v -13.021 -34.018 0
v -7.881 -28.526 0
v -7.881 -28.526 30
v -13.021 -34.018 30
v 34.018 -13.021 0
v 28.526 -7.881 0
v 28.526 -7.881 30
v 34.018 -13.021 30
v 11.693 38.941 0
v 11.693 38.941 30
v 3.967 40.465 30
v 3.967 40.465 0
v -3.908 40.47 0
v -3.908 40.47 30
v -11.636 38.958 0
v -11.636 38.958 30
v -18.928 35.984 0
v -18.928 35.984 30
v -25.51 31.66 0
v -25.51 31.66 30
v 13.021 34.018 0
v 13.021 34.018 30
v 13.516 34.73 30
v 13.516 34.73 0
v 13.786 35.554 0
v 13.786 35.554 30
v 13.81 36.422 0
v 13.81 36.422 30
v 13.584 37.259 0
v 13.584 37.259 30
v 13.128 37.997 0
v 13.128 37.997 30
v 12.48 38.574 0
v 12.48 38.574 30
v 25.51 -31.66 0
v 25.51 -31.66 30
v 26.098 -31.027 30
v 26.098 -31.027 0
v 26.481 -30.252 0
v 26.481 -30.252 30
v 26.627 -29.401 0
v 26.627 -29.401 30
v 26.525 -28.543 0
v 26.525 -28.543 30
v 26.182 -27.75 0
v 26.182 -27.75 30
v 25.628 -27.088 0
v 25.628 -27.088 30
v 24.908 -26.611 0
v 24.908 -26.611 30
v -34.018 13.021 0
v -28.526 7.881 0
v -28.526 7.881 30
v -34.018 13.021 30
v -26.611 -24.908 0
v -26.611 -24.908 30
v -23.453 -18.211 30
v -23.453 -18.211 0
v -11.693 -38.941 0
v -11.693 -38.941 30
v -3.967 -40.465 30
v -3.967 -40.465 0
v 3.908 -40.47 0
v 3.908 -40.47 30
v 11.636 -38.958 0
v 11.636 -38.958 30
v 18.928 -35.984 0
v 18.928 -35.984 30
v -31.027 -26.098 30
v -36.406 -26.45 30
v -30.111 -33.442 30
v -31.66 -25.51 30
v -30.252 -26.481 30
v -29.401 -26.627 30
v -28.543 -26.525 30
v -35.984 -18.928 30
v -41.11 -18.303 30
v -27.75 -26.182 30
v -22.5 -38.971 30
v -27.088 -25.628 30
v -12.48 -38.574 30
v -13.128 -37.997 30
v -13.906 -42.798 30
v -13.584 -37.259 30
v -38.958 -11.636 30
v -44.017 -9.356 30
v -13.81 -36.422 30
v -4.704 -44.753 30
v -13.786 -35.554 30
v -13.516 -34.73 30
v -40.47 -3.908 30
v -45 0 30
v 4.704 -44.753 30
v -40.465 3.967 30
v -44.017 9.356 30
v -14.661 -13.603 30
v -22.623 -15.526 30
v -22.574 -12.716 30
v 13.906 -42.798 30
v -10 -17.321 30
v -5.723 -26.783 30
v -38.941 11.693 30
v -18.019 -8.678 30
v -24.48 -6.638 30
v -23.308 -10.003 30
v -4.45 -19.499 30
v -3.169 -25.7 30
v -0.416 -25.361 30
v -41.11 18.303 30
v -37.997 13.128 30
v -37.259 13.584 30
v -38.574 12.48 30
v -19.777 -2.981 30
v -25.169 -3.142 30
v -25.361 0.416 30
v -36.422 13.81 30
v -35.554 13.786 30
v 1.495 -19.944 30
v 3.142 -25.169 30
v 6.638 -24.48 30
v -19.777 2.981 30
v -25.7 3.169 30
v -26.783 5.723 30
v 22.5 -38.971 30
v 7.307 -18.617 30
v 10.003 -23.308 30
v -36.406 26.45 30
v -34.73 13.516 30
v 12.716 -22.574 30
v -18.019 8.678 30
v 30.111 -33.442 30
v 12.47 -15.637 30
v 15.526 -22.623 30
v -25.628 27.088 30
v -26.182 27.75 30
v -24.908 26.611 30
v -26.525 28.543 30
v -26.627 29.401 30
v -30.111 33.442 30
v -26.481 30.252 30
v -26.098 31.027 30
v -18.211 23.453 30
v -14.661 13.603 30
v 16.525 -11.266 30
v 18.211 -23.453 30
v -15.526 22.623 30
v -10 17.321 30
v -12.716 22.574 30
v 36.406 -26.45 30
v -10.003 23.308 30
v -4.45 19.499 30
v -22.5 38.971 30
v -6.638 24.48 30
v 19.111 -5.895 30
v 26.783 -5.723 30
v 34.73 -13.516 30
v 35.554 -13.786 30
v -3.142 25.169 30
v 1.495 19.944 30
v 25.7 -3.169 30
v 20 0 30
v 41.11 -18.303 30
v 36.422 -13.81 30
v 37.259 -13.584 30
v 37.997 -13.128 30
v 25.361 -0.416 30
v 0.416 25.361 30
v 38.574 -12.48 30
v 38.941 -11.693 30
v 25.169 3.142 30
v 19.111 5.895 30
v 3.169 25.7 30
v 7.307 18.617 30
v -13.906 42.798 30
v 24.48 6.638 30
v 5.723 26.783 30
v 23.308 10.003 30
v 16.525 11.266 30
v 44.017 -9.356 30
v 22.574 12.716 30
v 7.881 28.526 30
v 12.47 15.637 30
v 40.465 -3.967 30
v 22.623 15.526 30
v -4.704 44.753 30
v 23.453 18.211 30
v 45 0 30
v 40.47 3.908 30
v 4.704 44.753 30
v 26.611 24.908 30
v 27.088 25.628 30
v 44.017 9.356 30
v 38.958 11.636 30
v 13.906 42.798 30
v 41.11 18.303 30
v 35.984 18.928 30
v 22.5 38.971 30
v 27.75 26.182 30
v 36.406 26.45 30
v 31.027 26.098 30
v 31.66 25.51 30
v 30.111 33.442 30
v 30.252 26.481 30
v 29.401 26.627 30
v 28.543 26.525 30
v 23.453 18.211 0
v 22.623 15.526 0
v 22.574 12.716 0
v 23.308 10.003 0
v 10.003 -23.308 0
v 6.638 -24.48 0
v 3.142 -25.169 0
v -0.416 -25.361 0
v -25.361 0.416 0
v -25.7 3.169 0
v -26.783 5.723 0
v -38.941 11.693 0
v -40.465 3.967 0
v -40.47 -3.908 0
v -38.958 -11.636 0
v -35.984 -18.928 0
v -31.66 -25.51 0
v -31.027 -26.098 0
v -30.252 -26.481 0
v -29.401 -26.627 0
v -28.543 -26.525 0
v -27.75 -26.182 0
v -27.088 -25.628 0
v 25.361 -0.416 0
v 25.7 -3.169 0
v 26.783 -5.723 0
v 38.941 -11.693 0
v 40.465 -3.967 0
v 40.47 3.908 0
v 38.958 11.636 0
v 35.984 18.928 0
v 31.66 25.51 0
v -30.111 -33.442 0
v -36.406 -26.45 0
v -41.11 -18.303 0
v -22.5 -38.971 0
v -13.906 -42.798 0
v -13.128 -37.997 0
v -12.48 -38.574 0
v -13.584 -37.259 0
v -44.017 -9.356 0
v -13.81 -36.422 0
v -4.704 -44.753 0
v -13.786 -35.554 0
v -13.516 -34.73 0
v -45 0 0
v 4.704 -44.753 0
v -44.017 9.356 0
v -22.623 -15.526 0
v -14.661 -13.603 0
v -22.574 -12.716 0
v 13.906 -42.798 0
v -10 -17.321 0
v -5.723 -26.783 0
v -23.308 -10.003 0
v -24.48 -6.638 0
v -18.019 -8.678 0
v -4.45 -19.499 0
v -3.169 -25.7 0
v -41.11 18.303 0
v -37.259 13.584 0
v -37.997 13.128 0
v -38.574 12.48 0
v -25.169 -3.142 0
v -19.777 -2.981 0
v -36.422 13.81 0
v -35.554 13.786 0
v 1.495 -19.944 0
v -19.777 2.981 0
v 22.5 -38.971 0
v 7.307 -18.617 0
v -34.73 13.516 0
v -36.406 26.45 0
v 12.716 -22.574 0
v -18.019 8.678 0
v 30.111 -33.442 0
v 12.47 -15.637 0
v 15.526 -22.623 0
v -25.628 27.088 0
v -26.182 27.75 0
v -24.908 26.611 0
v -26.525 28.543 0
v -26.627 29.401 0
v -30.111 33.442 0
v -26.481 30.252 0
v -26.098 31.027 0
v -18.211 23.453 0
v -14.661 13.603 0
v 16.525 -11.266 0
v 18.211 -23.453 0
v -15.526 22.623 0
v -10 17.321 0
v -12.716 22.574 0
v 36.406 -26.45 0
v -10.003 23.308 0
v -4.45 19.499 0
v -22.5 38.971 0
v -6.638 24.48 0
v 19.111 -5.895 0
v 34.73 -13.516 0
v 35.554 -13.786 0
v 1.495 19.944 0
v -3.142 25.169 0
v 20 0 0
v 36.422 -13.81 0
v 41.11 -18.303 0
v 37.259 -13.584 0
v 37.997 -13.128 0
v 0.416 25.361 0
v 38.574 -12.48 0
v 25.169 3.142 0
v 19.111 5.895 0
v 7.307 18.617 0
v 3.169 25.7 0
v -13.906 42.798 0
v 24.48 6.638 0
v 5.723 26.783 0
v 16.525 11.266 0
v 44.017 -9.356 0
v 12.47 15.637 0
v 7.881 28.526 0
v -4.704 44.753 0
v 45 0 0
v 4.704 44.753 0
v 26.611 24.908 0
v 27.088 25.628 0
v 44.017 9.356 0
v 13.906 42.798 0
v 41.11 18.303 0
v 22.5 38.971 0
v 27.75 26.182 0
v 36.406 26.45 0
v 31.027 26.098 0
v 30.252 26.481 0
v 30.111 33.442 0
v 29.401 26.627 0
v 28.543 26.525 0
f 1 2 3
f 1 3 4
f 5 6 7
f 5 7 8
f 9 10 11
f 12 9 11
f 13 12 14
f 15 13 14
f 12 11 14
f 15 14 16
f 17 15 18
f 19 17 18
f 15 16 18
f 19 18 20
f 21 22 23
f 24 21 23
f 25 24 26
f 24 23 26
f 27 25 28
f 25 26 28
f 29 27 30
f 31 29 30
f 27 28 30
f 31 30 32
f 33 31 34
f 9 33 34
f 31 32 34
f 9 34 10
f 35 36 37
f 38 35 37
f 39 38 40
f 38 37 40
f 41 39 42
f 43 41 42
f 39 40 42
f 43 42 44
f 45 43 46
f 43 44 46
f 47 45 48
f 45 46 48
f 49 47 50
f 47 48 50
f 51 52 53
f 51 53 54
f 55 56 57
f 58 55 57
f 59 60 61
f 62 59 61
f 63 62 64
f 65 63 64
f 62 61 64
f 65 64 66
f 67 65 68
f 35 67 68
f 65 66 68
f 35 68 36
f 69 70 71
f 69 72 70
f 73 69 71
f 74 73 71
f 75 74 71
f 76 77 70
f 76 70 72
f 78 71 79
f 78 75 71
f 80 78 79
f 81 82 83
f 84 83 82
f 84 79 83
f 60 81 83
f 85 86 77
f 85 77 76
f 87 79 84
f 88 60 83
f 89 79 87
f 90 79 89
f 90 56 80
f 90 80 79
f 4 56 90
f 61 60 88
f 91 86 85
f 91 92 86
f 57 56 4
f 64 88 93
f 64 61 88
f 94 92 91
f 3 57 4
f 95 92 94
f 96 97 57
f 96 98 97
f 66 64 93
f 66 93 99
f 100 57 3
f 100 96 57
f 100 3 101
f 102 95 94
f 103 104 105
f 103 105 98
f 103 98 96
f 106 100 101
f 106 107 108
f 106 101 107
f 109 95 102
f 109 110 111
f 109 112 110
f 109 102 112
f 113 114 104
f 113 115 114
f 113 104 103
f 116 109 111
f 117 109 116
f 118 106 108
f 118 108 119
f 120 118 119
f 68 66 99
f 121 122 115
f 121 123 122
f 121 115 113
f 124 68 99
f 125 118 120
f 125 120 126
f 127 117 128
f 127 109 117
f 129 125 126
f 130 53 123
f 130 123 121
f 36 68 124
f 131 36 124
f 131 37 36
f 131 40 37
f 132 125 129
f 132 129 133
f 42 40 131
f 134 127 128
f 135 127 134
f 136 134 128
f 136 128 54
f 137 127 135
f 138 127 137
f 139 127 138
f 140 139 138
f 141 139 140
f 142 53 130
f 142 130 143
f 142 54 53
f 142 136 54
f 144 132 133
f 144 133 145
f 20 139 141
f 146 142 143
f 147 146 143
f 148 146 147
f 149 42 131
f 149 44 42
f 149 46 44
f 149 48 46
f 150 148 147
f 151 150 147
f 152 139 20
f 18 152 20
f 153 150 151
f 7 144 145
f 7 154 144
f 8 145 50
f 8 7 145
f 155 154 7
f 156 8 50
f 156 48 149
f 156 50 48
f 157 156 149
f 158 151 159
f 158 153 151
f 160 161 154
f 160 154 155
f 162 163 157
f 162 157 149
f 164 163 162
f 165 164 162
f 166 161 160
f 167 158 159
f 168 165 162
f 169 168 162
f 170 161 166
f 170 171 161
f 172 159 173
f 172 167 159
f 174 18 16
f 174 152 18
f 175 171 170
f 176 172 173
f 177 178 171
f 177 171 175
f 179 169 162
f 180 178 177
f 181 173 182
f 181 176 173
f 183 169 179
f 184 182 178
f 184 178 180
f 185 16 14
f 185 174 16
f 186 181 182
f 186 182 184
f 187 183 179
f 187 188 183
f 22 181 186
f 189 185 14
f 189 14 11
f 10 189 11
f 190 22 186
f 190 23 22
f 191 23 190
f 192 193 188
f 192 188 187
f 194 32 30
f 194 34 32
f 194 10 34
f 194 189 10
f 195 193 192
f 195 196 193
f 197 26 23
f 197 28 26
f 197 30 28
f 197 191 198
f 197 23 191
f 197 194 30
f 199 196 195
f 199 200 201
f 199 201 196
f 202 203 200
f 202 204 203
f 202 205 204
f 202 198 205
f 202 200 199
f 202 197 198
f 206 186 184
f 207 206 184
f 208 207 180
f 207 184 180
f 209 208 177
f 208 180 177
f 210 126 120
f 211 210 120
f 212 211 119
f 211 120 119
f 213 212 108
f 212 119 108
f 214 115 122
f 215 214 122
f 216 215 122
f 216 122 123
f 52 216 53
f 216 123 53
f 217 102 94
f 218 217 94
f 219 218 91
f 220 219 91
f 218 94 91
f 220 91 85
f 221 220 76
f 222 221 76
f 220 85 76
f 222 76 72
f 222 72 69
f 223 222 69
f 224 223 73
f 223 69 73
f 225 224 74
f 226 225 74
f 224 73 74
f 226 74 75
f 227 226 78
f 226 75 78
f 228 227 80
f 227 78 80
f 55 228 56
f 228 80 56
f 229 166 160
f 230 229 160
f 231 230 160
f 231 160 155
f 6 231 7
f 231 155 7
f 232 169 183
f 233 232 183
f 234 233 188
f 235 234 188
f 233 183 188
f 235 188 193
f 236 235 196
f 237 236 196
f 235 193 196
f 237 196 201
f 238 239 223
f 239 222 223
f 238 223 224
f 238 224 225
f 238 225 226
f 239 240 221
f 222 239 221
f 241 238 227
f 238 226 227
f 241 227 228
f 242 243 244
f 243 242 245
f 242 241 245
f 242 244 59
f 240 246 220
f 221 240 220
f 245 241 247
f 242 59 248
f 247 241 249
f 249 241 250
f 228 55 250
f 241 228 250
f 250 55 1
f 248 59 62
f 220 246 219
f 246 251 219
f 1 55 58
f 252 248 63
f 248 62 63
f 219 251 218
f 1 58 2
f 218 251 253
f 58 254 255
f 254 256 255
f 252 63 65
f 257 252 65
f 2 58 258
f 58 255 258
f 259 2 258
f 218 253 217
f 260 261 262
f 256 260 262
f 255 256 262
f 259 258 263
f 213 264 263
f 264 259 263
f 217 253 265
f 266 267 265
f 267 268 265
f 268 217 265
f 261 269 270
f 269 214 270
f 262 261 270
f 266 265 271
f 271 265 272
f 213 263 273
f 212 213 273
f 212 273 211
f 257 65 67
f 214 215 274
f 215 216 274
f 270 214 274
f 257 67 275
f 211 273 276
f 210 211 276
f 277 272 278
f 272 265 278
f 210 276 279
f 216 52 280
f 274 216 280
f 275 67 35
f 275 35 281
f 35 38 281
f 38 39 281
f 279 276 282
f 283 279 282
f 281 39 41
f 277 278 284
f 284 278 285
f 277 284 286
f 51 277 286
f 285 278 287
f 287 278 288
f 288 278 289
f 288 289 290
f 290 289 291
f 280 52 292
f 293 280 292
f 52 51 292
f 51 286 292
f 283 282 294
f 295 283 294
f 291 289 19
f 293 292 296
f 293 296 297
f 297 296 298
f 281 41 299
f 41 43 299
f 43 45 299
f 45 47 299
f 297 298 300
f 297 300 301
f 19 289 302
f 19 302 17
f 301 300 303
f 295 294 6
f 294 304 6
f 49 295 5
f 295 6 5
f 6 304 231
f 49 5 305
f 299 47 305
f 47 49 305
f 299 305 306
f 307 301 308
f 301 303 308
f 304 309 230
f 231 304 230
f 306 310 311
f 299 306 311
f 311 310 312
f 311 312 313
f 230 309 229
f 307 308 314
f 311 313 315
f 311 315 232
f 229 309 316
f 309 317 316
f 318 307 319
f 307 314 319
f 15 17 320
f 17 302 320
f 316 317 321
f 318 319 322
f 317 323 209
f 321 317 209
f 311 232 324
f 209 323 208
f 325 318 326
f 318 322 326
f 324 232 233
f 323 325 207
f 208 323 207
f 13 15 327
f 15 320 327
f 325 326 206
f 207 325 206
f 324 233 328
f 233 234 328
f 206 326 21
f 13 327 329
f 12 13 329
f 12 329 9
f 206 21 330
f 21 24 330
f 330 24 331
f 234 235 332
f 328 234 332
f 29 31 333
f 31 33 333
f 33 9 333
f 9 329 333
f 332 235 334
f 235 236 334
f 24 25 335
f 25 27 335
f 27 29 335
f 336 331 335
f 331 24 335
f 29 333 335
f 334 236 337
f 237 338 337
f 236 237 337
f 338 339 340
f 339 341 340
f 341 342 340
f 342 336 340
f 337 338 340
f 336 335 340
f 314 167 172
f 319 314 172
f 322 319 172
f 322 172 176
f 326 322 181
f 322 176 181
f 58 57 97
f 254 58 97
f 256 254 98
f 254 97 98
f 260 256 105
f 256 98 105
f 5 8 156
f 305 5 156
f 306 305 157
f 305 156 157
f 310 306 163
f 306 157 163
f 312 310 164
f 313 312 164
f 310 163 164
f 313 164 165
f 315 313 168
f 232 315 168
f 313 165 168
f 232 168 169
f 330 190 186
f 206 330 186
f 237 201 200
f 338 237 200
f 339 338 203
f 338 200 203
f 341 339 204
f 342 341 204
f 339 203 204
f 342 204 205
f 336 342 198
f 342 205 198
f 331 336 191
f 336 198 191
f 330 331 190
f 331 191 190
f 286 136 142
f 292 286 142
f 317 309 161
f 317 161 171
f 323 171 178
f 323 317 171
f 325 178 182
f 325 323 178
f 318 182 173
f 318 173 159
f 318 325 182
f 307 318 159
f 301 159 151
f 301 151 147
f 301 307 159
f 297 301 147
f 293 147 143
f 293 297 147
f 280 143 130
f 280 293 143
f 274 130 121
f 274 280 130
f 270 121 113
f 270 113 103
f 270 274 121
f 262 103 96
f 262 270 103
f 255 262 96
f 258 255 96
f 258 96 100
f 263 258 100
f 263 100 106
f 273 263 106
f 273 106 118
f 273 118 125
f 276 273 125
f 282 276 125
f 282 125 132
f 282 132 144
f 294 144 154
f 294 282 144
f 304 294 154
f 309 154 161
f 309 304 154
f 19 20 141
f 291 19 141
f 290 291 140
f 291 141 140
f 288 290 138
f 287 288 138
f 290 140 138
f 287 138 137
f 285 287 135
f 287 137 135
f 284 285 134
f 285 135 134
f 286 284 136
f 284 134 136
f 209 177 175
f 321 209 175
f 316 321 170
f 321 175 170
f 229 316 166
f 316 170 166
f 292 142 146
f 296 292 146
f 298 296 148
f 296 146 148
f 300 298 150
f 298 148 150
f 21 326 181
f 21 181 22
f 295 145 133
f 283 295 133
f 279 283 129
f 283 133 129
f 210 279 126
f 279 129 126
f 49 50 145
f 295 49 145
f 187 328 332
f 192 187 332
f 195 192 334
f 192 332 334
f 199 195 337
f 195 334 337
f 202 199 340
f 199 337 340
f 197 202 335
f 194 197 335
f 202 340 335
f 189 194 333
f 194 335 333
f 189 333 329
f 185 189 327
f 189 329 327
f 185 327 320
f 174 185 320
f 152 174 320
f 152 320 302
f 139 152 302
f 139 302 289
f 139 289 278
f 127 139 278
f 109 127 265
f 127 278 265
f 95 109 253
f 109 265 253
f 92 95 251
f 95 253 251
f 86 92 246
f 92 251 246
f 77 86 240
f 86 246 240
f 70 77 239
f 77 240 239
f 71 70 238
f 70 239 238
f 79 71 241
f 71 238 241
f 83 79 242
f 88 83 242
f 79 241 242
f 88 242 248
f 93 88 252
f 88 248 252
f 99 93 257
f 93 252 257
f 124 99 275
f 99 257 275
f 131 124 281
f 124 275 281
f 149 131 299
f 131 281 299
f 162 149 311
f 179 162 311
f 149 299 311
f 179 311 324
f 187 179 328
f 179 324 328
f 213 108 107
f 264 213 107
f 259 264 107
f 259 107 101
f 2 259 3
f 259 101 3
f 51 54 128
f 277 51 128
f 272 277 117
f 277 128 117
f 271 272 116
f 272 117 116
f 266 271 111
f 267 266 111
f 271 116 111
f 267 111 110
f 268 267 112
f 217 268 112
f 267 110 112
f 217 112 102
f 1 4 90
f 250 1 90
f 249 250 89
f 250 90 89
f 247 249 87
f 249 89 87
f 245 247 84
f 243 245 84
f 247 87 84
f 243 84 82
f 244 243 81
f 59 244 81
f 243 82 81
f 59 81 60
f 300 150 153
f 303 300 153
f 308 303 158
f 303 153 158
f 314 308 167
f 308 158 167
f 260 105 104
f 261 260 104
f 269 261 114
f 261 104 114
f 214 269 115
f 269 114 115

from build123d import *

# Parameters (mm, degrees)
SKETCH1_R           = 45
SKETCH1_R_2         = 20
BOSS_EXTRUDE1_DEPTH = 30
CUT_EXTRUDE1_DEPTH  = 30


with BuildPart() as part:
    # Sketch1 → Boss-Extrude1 (new body)
    with BuildSketch(Plane.XY):
        Circle(SKETCH1_R)
        Circle(SKETCH1_R_2, mode=Mode.SUBTRACT)
    extrude(amount=BOSS_EXTRUDE1_DEPTH)

    # Sketch2 → Cut-Extrude1 (cut)
    with BuildSketch(Plane.XY.offset(30)):
        with BuildLine():
            Line((-24.907553239, 26.610521963), (-18.211403795, 23.452988079))
            ThreePointArc((-18.211403795, 23.452988079), (-14.122579745, 22.499392212), (-10.002690574, 23.308305316))
            ThreePointArc((-10.002690574, 23.308305316), (-4.902050675, 24.885755255), (0.415790578, 25.360560594))
            ThreePointArc((0.415790578, 25.360560594), (4.483384622, 26.152621175), (7.880614817, 28.525701089))
            Line((7.880614817, 28.525701089), (13.020947118, 34.017606823))
            ThreePointArc((13.020947118, 34.017606823), (13.72723623, 36.848657497), (11.693481002, 38.940912716))
            ThreePointArc((11.693481002, 38.940912716), (-7.808912198, 39.901792835), (-25.510313511, 31.660007671))
            ThreePointArc((-25.510313511, 31.660007671), (-26.606889428, 28.968389927), (-24.907553239, 26.610521963))
        make_face()
        with BuildLine():
            Line((28.525701089, -7.880614817), (34.017606823, -13.020947118))
            ThreePointArc((34.017606823, -13.020947118), (36.848657497, -13.72723623), (38.940912716, -11.693481002))
            ThreePointArc((38.940912716, -11.693481002), (39.901792835, 7.808912198), (31.660007671, 25.510313511))
            ThreePointArc((31.660007671, 25.510313511), (28.968389927, 26.606889428), (26.610521963, 24.907553239))
            Line((26.610521963, 24.907553239), (23.452988079, 18.211403795))
            ThreePointArc((23.452988079, 18.211403795), (22.499392212, 14.122579745), (23.308305316, 10.002690574))
            ThreePointArc((23.308305316, 10.002690574), (24.885755255, 4.902050675), (25.360560594, -0.415790578))
            ThreePointArc((25.360560594, -0.415790578), (26.152621175, -4.483384622), (28.525701089, -7.880614817))
        make_face()
        with BuildLine():
            Line((-7.880614817, -28.525701089), (-13.020947118, -34.017606823))
            ThreePointArc((-13.020947118, -34.017606823), (-13.72723623, -36.848657497), (-11.693481002, -38.940912716))
            ThreePointArc((-11.693481002, -38.940912716), (7.808912198, -39.901792835), (25.510313511, -31.660007671))
            ThreePointArc((25.510313511, -31.660007671), (26.606889428, -28.968389927), (24.907553239, -26.610521963))
            Line((24.907553239, -26.610521963), (18.211403795, -23.452988079))
            ThreePointArc((18.211403795, -23.452988079), (14.122579745, -22.499392212), (10.002690574, -23.308305316))
            ThreePointArc((10.002690574, -23.308305316), (4.902050675, -24.885755255), (-0.415790578, -25.360560594))
            ThreePointArc((-0.415790578, -25.360560594), (-4.483384622, -26.152621175), (-7.880614817, -28.525701089))
        make_face()
        with BuildLine():
            Line((-28.525701089, 7.880614817), (-34.017606823, 13.020947118))
            ThreePointArc((-34.017606823, 13.020947118), (-36.848657497, 13.72723623), (-38.940912716, 11.693481002))
            ThreePointArc((-38.940912716, 11.693481002), (-39.901792835, -7.808912198), (-31.660007671, -25.510313511))
            ThreePointArc((-31.660007671, -25.510313511), (-28.968389927, -26.606889428), (-26.610521963, -24.907553239))
            Line((-26.610521963, -24.907553239), (-23.452988079, -18.211403795))
            ThreePointArc((-23.452988079, -18.211403795), (-22.499392212, -14.122579745), (-23.308305316, -10.002690574))
            ThreePointArc((-23.308305316, -10.002690574), (-24.885755255, -4.902050675), (-25.360560594, 0.415790578))
            ThreePointArc((-25.360560594, 0.415790578), (-26.152621175, 4.483384622), (-28.525701089, 7.880614817))
        make_face()
    extrude(amount=-CUT_EXTRUDE1_DEPTH, mode=Mode.SUBTRACT)


solid = part.part
